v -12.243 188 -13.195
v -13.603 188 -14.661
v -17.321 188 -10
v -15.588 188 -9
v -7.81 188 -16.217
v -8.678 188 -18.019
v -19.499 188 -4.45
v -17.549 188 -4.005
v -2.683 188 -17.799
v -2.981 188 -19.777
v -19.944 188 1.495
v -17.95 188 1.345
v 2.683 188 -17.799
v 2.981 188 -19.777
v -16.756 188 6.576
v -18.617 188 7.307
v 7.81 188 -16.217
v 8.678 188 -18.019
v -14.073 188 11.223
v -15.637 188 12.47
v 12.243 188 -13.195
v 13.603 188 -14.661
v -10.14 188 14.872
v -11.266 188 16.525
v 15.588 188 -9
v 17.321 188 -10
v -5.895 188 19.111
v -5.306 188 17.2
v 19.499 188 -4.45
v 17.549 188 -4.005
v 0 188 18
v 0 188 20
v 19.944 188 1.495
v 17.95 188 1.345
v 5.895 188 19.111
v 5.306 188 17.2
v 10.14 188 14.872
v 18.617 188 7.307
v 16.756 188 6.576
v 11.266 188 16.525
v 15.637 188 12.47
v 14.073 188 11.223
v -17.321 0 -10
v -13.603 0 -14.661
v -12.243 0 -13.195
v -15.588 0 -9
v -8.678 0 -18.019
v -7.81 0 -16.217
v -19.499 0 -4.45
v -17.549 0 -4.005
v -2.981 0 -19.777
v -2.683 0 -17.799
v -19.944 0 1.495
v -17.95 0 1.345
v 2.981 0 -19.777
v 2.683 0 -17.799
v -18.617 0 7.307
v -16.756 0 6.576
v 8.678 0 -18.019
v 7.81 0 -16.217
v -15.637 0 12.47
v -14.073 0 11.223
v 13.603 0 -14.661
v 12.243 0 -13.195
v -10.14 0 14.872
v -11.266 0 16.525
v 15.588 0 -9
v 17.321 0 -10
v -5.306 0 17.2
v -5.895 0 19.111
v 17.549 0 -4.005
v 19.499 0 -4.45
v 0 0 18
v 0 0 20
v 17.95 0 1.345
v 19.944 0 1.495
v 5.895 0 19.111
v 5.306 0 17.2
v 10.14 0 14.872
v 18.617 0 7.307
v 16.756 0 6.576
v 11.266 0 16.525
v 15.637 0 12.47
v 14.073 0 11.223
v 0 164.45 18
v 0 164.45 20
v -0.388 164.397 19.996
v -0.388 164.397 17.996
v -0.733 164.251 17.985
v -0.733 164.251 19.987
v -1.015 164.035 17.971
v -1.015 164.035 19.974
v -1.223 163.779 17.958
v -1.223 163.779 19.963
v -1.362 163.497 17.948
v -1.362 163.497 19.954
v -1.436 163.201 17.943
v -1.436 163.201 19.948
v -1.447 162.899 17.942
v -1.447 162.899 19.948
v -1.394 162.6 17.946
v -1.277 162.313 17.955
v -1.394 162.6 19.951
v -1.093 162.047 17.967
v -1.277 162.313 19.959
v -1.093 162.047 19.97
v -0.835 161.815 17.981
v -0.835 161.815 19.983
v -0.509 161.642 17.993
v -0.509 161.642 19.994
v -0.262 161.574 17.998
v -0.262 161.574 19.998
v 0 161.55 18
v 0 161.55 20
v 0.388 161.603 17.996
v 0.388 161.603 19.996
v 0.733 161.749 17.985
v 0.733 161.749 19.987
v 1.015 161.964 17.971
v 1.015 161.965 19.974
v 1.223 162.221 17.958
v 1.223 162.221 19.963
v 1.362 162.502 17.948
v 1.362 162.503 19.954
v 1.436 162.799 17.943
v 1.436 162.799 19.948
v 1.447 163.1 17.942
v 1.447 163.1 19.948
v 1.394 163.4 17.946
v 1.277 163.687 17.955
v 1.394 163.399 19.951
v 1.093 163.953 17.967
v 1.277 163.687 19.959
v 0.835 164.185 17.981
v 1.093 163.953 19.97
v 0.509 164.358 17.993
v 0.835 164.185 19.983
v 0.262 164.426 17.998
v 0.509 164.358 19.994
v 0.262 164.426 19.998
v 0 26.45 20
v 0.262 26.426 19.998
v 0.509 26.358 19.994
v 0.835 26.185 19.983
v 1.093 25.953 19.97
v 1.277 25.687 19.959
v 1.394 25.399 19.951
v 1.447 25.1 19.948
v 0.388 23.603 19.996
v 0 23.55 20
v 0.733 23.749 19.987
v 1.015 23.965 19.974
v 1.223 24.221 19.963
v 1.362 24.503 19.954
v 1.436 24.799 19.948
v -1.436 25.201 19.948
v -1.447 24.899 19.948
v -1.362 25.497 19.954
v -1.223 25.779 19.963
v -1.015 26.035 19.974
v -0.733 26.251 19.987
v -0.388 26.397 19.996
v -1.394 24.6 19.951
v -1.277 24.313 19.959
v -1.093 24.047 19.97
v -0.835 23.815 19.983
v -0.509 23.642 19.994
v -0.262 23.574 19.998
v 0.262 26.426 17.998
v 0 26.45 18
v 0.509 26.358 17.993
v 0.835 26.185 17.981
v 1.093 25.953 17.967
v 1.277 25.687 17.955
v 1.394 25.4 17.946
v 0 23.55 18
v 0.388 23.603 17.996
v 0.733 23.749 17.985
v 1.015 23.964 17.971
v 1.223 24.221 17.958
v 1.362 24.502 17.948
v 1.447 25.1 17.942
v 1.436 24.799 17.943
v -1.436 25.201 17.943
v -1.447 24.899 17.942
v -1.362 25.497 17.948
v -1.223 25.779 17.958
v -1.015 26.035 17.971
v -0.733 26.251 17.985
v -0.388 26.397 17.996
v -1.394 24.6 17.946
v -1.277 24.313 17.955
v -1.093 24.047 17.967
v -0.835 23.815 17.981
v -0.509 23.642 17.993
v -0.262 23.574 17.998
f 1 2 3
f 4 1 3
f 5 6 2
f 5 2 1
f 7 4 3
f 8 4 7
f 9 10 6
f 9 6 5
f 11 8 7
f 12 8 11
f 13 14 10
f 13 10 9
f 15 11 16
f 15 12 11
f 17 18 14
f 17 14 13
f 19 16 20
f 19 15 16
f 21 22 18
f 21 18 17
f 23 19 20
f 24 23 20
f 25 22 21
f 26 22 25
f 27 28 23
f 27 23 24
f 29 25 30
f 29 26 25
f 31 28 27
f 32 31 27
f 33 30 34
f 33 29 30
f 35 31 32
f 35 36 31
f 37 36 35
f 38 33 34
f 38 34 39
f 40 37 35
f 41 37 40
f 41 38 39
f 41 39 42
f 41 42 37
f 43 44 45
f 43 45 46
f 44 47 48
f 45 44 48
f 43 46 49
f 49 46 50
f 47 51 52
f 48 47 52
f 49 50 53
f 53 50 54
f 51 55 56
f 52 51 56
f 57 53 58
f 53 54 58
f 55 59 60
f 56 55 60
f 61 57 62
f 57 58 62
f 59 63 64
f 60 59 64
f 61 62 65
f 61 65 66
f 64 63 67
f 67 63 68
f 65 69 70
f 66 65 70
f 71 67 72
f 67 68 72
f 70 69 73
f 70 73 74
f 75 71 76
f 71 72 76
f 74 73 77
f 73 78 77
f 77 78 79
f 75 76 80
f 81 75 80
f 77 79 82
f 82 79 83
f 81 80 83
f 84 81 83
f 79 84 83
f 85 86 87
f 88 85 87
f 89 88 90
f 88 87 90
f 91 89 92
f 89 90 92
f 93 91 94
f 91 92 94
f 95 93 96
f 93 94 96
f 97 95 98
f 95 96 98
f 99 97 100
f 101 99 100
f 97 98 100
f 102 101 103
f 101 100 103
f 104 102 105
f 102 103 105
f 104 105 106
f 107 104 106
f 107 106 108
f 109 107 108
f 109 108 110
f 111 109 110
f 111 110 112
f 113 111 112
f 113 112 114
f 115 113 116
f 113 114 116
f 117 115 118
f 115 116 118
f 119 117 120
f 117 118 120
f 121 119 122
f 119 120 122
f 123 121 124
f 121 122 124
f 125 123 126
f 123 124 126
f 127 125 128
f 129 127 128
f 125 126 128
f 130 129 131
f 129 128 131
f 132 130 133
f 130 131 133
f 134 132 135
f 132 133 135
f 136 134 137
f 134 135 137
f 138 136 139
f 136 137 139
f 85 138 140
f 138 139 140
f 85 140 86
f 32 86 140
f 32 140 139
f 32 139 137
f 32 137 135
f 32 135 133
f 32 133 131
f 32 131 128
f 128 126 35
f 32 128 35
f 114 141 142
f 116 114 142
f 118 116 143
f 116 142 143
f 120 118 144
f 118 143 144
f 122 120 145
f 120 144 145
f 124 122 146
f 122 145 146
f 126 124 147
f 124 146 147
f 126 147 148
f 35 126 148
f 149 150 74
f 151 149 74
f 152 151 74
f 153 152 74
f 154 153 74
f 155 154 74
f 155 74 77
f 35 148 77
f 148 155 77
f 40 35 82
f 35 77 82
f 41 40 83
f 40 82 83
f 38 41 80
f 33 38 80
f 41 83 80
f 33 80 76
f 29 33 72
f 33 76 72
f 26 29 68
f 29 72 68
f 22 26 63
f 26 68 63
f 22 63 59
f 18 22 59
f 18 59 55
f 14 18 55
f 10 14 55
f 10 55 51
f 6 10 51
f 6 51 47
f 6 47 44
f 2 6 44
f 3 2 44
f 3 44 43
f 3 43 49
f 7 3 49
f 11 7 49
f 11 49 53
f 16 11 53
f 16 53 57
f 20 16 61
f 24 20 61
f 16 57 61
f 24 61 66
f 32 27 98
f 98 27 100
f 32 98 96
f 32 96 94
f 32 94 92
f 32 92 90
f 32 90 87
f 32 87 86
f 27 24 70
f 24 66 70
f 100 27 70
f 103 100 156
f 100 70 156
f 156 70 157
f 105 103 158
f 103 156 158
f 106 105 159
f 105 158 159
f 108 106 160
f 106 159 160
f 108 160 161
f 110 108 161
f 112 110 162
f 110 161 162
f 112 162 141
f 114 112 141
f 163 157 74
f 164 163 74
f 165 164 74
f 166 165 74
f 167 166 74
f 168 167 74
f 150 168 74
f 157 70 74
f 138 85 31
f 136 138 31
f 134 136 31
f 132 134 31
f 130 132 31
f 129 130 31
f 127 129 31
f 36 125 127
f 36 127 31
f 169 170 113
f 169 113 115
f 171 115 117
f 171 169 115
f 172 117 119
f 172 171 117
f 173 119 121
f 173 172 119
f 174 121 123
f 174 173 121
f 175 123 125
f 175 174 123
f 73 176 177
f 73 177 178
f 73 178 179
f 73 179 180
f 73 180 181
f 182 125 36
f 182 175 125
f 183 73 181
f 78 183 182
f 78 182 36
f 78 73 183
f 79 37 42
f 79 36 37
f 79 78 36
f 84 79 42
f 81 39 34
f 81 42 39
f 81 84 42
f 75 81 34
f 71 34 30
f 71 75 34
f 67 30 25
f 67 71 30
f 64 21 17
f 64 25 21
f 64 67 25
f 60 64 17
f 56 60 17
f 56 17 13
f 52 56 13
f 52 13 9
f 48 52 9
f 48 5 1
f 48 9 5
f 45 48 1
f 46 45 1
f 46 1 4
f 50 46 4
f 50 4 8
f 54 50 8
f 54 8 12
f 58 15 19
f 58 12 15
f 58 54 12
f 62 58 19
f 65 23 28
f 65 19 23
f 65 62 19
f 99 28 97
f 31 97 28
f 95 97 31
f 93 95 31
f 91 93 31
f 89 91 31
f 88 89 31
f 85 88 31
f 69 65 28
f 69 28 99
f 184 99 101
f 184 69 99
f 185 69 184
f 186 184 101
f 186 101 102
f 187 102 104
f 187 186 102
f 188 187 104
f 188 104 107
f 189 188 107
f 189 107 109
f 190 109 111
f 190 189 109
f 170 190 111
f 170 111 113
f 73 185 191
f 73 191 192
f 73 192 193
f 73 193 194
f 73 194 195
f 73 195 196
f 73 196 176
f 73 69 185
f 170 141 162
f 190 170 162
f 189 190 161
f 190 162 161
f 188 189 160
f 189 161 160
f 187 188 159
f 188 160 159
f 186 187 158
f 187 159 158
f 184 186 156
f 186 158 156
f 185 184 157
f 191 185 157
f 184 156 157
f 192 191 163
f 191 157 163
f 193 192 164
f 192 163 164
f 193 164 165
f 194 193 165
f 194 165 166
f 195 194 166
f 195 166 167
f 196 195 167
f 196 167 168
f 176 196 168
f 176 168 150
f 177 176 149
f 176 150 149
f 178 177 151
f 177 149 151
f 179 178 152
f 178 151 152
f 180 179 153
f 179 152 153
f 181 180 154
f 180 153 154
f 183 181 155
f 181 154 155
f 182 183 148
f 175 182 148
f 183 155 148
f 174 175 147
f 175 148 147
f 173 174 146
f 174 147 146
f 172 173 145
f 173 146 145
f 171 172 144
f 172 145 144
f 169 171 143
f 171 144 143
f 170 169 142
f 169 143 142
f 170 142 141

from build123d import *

# Parameters (mm, degrees)
SKETCH_1_R                    = 20
EXTRUDE_1_DEPTH               = 188
CUT_EXTRUDE_2_DEPTH           = 191.115754213
CUT_EXTRUDE_2_DEPTH_BACK      = 191.115754213
SKETCH_2_R                    = 18
SKETCH_5_W                    = 1.45
SKETCH_5_H                    = 20
HOLE_WIZARD_M2_5_1_AT_2_COUNT = 2
HOLE_WIZARD_M2_5_1_AT_2_PITCH = 138


with BuildPart() as part:
    # 스케치1 → 보스-돌출1 (new body)
    with BuildSketch(Plane(origin=(0, 0, 0), x_dir=(1, 0, 0), z_dir=(0, 1, 0))):
        with Locations(Location((0, 0, 0), (0, 0, 270))):
            Circle(SKETCH_1_R)
    extrude(amount=EXTRUDE_1_DEPTH)

    # 스케치2 → 컷-돌출2 (cut, two sides: drawn at the far end of the back side and taken through both)
    with BuildSketch(Plane(origin=(0, 0, 0), x_dir=(1, 0, 0), z_dir=(0, 1, 0)).offset(-CUT_EXTRUDE_2_DEPTH_BACK)):
        with Locations(Location((0, 0, 0), (0, 0, 270))):
            Circle(SKETCH_2_R)
    extrude(amount=CUT_EXTRUDE_2_DEPTH + CUT_EXTRUDE_2_DEPTH_BACK, mode=Mode.SUBTRACT)

    # 스케치5 → M2.5 여유 구멍1 (revolve, cut)
    with BuildSketch(Plane(origin=(0, 163, 0), x_dir=(0, 1, 0), z_dir=(1, 0, 0))):
        with Locations((0.725, 10)):
            Rectangle(SKETCH_5_W, SKETCH_5_H)
    hole_wizard_m2_5_1 = revolve(axis=Axis((0, 163, -6.35), (0, 0, 1)), mode=Mode.SUBTRACT)

    # M2.5 여유 구멍1 at 2: M2.5 여유 구멍1 ×2
    with Locations(*[(0, -i * HOLE_WIZARD_M2_5_1_AT_2_PITCH, 0) for i in range(1, HOLE_WIZARD_M2_5_1_AT_2_COUNT)]):
        add(hole_wizard_m2_5_1, mode=Mode.SUBTRACT)


solid = part.part
